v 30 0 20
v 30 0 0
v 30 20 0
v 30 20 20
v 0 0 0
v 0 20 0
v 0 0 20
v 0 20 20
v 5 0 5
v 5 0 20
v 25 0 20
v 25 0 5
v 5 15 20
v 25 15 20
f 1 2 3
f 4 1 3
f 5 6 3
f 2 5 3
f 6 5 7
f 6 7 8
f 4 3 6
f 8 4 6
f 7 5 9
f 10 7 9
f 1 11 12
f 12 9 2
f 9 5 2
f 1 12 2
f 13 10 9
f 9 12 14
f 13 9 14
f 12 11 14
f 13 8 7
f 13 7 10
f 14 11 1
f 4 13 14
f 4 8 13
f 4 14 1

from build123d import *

# Parameters (mm, degrees)
F0_W     = 5
F0_H     = 20
F0_W_2   = 20
F1_DEPTH = 20
F3_START = -5
F3_DEPTH = 20


with BuildPart() as f1:
    # F0 (on Top) → F1 (new body)
    with BuildSketch(Plane.XY):
        with Locations((2.5, 10)):
            Rectangle(F0_W, F0_H)
        with Locations((27.5, 10)):
            Rectangle(F0_W, F0_H)
        with Locations((15, 10)):
            Rectangle(F0_W_2, F0_H)
    extrude(amount=F1_DEPTH)

    # F2 (on face) → F3 (cut)
    with BuildSketch(Plane.YZ.offset(30).offset(F3_START)):
        Polygon((0, 5), (15, 20), (0, 20), align=None)
    extrude(amount=-F3_DEPTH, mode=Mode.SUBTRACT)


solid = f1.part
